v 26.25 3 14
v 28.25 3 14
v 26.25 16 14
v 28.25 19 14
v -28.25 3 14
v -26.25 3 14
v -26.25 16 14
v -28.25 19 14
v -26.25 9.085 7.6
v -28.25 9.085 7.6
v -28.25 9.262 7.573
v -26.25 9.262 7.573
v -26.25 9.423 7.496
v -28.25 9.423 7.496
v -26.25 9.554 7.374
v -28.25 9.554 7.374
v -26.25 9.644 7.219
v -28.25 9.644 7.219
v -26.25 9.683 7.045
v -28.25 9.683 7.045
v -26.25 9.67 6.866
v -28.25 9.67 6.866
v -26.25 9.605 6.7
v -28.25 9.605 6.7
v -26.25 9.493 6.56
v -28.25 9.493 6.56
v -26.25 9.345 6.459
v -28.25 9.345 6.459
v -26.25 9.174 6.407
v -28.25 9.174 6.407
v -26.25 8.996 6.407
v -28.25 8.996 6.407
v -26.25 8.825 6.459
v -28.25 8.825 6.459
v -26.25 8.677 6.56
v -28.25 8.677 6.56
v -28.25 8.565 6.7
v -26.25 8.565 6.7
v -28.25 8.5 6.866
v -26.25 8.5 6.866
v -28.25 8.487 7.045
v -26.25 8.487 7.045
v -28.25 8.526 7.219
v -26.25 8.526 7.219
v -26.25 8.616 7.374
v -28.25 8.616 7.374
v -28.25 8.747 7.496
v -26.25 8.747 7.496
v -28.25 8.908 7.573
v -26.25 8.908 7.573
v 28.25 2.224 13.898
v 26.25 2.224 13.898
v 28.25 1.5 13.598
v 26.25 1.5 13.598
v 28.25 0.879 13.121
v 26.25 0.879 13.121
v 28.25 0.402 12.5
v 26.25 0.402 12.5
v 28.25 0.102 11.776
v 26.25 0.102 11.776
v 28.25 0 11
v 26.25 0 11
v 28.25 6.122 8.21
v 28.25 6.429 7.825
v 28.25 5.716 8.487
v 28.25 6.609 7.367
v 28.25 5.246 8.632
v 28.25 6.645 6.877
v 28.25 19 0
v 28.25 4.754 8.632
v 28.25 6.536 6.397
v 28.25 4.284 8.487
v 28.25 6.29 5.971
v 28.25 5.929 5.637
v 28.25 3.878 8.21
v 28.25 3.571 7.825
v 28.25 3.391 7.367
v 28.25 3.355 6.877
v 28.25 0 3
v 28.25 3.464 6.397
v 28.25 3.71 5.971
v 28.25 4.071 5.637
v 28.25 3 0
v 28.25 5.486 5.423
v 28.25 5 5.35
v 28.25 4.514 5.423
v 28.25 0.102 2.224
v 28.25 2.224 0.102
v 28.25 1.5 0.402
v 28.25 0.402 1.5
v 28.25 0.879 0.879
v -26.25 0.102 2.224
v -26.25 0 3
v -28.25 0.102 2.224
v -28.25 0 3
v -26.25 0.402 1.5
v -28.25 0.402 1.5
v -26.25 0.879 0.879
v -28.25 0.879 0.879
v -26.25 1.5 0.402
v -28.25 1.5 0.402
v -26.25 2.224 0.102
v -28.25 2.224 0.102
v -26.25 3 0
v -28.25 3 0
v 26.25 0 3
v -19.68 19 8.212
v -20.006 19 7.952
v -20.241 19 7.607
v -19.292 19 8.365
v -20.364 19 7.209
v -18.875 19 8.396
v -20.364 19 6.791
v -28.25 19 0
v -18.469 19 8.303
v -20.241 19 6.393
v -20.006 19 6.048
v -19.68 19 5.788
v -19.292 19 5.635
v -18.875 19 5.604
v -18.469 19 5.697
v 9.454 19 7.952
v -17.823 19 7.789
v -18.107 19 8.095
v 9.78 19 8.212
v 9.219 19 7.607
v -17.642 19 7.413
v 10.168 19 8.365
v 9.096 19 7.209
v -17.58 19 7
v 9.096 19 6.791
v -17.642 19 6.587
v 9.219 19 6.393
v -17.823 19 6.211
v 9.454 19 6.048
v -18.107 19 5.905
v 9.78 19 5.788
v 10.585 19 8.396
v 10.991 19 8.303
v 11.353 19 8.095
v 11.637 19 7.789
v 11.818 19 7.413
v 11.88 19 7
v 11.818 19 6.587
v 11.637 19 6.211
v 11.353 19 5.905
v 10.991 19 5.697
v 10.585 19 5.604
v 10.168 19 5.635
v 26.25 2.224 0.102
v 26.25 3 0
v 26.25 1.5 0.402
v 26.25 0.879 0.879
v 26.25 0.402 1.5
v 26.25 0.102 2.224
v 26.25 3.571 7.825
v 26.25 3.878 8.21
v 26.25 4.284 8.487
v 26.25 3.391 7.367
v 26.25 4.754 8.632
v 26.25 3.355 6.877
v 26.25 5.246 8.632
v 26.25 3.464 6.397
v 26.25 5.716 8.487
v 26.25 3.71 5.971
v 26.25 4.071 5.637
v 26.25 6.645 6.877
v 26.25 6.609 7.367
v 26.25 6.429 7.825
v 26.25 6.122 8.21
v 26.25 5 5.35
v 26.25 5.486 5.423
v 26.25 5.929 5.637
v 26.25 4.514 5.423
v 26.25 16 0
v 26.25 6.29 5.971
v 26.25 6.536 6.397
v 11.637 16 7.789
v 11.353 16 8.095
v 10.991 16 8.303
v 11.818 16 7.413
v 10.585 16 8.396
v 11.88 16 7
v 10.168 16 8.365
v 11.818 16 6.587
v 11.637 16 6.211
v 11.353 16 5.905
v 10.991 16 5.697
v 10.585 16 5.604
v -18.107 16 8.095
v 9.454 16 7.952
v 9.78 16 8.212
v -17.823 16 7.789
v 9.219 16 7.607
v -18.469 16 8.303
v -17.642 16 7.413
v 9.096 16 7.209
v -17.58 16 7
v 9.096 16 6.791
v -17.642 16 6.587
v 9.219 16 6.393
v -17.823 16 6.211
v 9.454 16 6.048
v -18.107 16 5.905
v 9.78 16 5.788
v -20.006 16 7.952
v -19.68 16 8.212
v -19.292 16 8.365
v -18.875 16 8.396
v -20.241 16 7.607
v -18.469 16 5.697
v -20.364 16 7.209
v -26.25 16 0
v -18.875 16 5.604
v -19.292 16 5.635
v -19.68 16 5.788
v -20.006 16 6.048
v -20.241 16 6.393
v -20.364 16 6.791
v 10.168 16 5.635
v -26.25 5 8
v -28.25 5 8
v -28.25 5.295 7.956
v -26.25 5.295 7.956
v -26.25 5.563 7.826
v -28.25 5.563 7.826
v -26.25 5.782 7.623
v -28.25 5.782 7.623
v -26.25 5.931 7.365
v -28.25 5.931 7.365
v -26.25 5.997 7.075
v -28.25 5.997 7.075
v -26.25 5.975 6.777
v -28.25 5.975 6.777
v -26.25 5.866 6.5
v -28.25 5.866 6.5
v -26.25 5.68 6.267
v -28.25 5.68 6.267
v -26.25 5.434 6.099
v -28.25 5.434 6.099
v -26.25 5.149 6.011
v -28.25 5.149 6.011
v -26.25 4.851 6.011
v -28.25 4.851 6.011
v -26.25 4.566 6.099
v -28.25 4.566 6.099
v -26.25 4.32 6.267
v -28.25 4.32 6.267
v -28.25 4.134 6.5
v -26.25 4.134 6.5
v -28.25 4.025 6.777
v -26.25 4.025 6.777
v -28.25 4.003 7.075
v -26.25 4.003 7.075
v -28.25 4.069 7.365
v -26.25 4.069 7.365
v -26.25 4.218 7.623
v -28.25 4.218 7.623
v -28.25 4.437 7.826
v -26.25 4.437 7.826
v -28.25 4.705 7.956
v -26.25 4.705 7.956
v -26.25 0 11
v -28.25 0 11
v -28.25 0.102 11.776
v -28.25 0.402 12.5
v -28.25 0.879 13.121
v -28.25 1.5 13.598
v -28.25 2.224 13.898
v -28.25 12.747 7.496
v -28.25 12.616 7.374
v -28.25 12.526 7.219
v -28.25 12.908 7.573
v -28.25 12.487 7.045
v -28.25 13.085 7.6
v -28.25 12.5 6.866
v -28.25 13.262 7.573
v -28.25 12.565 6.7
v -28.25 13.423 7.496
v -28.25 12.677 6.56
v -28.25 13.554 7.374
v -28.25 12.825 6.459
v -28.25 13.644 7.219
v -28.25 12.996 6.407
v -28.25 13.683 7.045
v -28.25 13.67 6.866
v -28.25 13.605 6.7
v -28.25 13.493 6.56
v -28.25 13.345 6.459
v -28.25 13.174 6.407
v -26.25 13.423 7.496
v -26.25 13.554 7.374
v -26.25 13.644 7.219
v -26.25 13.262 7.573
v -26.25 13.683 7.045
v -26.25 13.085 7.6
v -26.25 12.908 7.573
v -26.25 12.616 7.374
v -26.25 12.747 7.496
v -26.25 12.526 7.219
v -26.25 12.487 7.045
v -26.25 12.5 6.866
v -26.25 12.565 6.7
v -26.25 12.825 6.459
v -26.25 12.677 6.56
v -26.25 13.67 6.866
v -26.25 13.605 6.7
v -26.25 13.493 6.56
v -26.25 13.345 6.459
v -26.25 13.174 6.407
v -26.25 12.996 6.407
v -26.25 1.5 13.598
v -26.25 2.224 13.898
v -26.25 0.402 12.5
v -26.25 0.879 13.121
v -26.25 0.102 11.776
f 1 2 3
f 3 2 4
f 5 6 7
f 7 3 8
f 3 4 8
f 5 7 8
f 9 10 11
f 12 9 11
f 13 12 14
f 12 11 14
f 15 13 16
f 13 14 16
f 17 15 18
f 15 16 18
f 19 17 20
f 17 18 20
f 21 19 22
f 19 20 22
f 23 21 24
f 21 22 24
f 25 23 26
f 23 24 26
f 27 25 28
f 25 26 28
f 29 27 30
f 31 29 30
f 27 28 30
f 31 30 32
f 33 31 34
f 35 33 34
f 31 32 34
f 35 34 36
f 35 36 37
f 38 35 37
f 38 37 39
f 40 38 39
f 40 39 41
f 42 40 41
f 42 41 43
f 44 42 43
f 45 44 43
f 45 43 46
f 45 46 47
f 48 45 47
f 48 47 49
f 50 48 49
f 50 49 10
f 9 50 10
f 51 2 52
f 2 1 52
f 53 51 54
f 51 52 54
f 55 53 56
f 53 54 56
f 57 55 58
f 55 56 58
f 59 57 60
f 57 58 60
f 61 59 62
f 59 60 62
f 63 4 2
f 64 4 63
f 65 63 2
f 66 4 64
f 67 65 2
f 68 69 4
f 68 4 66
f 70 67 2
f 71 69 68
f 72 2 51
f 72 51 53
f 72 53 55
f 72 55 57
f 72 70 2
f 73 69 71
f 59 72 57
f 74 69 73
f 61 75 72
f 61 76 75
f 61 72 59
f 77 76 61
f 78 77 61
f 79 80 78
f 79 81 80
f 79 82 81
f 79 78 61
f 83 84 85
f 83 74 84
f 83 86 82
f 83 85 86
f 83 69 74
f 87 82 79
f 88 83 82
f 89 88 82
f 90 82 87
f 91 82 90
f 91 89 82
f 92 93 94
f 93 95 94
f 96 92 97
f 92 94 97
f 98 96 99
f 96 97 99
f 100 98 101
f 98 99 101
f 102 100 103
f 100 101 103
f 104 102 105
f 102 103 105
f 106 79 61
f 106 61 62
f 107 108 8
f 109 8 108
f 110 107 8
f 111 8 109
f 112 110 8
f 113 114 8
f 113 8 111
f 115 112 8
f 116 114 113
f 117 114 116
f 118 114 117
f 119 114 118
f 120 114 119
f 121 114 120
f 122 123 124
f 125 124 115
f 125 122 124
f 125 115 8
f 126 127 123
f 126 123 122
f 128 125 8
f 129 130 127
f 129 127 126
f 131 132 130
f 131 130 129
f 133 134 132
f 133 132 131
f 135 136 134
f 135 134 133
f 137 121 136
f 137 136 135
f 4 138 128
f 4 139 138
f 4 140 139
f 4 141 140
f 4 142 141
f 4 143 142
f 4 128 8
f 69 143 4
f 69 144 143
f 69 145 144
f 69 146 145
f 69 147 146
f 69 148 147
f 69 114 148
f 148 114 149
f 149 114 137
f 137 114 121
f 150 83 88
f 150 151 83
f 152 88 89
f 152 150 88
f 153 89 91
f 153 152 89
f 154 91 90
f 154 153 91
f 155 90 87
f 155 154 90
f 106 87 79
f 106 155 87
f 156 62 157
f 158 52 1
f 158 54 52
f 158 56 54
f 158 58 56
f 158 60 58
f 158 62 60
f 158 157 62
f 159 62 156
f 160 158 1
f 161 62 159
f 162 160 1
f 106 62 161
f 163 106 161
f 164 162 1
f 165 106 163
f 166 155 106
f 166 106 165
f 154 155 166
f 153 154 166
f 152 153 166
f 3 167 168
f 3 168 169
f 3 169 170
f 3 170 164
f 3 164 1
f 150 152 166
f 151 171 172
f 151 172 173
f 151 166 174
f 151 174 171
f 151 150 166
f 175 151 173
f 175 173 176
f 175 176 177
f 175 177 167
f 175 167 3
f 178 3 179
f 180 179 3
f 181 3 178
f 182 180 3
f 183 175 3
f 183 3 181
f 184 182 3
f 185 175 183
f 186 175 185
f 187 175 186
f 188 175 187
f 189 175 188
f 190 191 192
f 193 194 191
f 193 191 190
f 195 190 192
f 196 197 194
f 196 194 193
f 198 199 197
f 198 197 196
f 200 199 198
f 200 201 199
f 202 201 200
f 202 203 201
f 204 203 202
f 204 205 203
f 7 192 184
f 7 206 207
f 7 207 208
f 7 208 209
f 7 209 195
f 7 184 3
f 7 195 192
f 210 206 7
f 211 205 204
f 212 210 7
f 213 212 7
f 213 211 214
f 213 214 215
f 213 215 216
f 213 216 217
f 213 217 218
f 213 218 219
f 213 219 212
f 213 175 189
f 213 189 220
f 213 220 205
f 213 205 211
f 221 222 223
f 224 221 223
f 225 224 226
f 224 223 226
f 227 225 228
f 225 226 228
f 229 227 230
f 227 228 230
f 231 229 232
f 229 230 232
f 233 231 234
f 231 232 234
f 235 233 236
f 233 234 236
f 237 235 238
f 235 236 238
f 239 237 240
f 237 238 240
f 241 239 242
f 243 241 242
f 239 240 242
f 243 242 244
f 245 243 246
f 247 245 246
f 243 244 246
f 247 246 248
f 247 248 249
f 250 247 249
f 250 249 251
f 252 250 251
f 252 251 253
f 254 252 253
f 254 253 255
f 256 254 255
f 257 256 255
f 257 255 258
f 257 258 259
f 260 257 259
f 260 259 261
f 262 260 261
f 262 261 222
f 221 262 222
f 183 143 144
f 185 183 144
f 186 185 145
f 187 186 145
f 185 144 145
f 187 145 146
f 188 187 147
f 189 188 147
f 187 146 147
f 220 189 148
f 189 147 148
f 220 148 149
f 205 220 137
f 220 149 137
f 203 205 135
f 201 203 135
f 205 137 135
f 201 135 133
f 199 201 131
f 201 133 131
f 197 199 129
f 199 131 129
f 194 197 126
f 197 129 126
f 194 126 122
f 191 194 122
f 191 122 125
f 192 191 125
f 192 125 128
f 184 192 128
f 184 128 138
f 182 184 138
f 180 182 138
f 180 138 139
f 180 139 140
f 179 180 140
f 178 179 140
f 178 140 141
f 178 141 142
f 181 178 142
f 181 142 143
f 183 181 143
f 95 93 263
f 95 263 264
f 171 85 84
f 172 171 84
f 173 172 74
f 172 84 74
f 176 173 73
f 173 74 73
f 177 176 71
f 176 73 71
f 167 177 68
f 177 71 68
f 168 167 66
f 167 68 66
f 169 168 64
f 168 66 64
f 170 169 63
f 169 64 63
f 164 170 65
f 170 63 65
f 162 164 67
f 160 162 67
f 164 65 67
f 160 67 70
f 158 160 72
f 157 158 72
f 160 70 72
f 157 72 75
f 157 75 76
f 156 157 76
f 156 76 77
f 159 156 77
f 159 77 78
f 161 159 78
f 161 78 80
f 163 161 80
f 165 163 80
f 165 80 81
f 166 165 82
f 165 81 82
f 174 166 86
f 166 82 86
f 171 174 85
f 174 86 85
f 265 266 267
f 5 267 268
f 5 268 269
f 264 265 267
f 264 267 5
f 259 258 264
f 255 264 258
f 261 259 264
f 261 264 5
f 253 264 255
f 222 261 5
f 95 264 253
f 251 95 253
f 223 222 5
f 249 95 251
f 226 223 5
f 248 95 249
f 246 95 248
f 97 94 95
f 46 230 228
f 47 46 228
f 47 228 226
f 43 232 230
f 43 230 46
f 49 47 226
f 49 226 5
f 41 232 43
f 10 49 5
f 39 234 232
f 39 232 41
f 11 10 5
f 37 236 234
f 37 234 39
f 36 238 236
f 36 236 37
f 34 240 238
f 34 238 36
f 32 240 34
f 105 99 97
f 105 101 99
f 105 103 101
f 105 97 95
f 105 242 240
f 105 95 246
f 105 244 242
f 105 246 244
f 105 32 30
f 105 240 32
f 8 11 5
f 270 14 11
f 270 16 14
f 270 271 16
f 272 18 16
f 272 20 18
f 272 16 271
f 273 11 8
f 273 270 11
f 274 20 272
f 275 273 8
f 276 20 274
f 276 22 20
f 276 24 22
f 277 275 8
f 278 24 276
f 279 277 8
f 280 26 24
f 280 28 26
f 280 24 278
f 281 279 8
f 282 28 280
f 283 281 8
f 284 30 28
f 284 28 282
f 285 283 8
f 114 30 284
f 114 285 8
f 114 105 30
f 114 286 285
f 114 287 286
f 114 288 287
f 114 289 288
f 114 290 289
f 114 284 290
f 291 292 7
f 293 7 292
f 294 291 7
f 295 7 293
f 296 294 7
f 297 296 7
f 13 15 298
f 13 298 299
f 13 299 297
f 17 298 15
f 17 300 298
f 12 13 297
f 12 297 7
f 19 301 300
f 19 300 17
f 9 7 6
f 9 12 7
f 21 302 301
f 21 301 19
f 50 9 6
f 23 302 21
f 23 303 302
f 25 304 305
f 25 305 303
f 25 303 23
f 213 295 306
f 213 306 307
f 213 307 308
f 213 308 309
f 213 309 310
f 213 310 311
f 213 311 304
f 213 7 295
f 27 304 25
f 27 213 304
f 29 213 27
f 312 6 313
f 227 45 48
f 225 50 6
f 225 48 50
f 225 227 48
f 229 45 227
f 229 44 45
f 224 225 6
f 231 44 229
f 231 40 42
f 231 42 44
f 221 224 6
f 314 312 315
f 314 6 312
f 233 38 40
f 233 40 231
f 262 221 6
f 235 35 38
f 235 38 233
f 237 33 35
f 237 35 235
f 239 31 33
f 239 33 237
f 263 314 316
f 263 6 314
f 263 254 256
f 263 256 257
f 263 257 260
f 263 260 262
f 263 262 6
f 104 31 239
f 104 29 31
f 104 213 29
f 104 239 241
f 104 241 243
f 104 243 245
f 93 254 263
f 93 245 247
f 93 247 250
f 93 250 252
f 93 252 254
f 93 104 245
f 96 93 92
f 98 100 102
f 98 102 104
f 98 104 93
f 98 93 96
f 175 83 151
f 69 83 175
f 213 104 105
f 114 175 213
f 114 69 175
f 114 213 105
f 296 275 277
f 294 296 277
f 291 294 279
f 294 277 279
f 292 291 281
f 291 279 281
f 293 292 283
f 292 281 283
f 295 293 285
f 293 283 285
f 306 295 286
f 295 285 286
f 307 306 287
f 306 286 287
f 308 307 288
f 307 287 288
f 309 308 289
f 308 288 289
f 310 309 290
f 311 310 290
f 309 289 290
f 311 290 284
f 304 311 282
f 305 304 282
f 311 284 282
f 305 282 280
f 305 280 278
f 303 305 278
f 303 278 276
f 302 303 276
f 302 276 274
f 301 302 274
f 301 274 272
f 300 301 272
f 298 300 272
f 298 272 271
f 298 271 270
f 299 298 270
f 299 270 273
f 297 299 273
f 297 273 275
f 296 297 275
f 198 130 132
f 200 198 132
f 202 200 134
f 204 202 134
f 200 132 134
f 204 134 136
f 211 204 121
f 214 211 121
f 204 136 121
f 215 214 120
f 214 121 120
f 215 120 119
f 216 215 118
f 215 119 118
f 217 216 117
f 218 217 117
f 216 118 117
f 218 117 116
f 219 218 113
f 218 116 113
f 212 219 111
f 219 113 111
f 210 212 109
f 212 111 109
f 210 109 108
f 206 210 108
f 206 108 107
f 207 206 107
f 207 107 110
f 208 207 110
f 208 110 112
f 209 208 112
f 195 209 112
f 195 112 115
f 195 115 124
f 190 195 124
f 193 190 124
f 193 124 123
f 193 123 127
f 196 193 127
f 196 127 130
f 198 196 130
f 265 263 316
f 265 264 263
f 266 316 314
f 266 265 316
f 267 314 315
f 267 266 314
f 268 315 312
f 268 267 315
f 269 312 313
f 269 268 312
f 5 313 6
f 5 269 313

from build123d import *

# Parameters (mm, degrees)
EXTRUDE_1_DEPTH     = 14
SKETCH_2_R          = 1.65
CUT_EXTRUDE_1_DEPTH = 2
SKETCH_3_R          = 1.4
CUT_EXTRUDE_2_DEPTH = 14
FILLET_1_R          = 3
SKETCH_5_R          = 0.6
SKETCH_5_R_2        = 1
CUT_EXTRUDE_3_DEPTH = 10


with BuildPart() as part:
    # 草图1 → 凸台-拉伸1 (new body)
    with BuildSketch(Plane.XY):
        Polygon((-28.25, 0), (-28.25, 19), (28.25, 19), (28.25, 0), (26.25, 0), (26.25, 16), (-26.25, 16), (-26.25, 0), align=None)
    extrude(amount=EXTRUDE_1_DEPTH)

    # 草图2 → 切除-拉伸1 (cut)
    with BuildSketch(Plane(origin=(28.25, 0, 0), x_dir=(0, 0, -1), z_dir=(1, 0, 0))):
        with Locations((-7, 5)):
            Circle(SKETCH_2_R)
    extrude(amount=-CUT_EXTRUDE_1_DEPTH, mode=Mode.SUBTRACT)

    # 草图3 → 切除-拉伸2 (cut)
    with BuildSketch(Plane(origin=(0, 19, 0), x_dir=(1, 0, 0), z_dir=(0, 1, 0))):
        with Locations((-18.98, -7)):
            Circle(SKETCH_3_R)
        with Locations((10.48, -7)):
            Circle(SKETCH_3_R)
    extrude(amount=-CUT_EXTRUDE_2_DEPTH, mode=Mode.SUBTRACT)

    # 圆角1
    fillet_1_edges = [part.edges().sort_by_distance(p)[0] for p in [
        (-27.25, 0, 0),
        (27.25, 0, 0),
        (27.25, 0, 14),
        (-27.25, 0, 14),
    ]]
    fillet(fillet_1_edges, radius=FILLET_1_R)

    # 草图5 → 切除-拉伸3 (cut)
    with BuildSketch(Plane.ZY.offset(28.25)):
        with Locations((7, 9.085)):
            Circle(SKETCH_5_R)
        with Locations((7, 13.085)):
            Circle(SKETCH_5_R)
        with Locations((7, 5)):
            Circle(SKETCH_5_R_2)
    extrude(amount=-CUT_EXTRUDE_3_DEPTH, mode=Mode.SUBTRACT)


solid = part.part
